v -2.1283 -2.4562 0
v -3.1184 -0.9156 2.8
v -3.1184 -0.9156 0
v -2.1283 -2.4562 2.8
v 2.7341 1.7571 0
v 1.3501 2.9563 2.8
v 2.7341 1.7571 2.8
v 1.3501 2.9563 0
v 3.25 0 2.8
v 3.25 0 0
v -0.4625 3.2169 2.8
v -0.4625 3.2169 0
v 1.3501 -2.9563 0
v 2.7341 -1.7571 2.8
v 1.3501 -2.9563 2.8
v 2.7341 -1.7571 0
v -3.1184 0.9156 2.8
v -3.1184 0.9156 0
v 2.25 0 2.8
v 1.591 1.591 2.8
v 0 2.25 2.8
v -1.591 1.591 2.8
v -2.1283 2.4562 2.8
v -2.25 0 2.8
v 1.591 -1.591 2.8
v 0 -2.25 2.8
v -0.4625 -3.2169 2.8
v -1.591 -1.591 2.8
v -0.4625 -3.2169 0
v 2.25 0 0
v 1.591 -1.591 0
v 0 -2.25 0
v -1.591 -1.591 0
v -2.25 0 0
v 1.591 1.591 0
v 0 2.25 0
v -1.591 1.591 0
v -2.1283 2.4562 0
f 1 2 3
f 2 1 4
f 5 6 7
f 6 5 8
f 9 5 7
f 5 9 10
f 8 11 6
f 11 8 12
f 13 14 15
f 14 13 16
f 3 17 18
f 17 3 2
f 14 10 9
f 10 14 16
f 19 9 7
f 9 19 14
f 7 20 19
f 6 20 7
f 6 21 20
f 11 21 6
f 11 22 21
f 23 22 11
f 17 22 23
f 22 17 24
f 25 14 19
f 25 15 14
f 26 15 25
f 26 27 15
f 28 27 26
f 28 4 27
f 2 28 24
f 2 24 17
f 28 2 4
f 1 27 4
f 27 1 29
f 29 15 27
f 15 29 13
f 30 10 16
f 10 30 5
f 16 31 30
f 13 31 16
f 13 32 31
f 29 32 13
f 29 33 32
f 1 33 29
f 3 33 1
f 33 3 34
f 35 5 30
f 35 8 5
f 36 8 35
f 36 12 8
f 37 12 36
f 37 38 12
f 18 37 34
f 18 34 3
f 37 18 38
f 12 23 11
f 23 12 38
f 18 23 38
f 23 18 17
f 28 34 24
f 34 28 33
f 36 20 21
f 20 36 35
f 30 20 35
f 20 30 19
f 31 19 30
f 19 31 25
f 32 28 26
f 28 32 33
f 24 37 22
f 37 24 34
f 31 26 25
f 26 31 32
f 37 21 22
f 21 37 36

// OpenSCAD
m4_hole_radius=2.05;

module m4_standoff(height=2.8) {
    difference() {
        // main body
        cylinder(h=height, r=6.5/2);
        // cutout hole
        translate([0,0,-1]) cylinder(h=height+2, r=m4_hole_radius+0.2);
    }
}

m4_standoff();
